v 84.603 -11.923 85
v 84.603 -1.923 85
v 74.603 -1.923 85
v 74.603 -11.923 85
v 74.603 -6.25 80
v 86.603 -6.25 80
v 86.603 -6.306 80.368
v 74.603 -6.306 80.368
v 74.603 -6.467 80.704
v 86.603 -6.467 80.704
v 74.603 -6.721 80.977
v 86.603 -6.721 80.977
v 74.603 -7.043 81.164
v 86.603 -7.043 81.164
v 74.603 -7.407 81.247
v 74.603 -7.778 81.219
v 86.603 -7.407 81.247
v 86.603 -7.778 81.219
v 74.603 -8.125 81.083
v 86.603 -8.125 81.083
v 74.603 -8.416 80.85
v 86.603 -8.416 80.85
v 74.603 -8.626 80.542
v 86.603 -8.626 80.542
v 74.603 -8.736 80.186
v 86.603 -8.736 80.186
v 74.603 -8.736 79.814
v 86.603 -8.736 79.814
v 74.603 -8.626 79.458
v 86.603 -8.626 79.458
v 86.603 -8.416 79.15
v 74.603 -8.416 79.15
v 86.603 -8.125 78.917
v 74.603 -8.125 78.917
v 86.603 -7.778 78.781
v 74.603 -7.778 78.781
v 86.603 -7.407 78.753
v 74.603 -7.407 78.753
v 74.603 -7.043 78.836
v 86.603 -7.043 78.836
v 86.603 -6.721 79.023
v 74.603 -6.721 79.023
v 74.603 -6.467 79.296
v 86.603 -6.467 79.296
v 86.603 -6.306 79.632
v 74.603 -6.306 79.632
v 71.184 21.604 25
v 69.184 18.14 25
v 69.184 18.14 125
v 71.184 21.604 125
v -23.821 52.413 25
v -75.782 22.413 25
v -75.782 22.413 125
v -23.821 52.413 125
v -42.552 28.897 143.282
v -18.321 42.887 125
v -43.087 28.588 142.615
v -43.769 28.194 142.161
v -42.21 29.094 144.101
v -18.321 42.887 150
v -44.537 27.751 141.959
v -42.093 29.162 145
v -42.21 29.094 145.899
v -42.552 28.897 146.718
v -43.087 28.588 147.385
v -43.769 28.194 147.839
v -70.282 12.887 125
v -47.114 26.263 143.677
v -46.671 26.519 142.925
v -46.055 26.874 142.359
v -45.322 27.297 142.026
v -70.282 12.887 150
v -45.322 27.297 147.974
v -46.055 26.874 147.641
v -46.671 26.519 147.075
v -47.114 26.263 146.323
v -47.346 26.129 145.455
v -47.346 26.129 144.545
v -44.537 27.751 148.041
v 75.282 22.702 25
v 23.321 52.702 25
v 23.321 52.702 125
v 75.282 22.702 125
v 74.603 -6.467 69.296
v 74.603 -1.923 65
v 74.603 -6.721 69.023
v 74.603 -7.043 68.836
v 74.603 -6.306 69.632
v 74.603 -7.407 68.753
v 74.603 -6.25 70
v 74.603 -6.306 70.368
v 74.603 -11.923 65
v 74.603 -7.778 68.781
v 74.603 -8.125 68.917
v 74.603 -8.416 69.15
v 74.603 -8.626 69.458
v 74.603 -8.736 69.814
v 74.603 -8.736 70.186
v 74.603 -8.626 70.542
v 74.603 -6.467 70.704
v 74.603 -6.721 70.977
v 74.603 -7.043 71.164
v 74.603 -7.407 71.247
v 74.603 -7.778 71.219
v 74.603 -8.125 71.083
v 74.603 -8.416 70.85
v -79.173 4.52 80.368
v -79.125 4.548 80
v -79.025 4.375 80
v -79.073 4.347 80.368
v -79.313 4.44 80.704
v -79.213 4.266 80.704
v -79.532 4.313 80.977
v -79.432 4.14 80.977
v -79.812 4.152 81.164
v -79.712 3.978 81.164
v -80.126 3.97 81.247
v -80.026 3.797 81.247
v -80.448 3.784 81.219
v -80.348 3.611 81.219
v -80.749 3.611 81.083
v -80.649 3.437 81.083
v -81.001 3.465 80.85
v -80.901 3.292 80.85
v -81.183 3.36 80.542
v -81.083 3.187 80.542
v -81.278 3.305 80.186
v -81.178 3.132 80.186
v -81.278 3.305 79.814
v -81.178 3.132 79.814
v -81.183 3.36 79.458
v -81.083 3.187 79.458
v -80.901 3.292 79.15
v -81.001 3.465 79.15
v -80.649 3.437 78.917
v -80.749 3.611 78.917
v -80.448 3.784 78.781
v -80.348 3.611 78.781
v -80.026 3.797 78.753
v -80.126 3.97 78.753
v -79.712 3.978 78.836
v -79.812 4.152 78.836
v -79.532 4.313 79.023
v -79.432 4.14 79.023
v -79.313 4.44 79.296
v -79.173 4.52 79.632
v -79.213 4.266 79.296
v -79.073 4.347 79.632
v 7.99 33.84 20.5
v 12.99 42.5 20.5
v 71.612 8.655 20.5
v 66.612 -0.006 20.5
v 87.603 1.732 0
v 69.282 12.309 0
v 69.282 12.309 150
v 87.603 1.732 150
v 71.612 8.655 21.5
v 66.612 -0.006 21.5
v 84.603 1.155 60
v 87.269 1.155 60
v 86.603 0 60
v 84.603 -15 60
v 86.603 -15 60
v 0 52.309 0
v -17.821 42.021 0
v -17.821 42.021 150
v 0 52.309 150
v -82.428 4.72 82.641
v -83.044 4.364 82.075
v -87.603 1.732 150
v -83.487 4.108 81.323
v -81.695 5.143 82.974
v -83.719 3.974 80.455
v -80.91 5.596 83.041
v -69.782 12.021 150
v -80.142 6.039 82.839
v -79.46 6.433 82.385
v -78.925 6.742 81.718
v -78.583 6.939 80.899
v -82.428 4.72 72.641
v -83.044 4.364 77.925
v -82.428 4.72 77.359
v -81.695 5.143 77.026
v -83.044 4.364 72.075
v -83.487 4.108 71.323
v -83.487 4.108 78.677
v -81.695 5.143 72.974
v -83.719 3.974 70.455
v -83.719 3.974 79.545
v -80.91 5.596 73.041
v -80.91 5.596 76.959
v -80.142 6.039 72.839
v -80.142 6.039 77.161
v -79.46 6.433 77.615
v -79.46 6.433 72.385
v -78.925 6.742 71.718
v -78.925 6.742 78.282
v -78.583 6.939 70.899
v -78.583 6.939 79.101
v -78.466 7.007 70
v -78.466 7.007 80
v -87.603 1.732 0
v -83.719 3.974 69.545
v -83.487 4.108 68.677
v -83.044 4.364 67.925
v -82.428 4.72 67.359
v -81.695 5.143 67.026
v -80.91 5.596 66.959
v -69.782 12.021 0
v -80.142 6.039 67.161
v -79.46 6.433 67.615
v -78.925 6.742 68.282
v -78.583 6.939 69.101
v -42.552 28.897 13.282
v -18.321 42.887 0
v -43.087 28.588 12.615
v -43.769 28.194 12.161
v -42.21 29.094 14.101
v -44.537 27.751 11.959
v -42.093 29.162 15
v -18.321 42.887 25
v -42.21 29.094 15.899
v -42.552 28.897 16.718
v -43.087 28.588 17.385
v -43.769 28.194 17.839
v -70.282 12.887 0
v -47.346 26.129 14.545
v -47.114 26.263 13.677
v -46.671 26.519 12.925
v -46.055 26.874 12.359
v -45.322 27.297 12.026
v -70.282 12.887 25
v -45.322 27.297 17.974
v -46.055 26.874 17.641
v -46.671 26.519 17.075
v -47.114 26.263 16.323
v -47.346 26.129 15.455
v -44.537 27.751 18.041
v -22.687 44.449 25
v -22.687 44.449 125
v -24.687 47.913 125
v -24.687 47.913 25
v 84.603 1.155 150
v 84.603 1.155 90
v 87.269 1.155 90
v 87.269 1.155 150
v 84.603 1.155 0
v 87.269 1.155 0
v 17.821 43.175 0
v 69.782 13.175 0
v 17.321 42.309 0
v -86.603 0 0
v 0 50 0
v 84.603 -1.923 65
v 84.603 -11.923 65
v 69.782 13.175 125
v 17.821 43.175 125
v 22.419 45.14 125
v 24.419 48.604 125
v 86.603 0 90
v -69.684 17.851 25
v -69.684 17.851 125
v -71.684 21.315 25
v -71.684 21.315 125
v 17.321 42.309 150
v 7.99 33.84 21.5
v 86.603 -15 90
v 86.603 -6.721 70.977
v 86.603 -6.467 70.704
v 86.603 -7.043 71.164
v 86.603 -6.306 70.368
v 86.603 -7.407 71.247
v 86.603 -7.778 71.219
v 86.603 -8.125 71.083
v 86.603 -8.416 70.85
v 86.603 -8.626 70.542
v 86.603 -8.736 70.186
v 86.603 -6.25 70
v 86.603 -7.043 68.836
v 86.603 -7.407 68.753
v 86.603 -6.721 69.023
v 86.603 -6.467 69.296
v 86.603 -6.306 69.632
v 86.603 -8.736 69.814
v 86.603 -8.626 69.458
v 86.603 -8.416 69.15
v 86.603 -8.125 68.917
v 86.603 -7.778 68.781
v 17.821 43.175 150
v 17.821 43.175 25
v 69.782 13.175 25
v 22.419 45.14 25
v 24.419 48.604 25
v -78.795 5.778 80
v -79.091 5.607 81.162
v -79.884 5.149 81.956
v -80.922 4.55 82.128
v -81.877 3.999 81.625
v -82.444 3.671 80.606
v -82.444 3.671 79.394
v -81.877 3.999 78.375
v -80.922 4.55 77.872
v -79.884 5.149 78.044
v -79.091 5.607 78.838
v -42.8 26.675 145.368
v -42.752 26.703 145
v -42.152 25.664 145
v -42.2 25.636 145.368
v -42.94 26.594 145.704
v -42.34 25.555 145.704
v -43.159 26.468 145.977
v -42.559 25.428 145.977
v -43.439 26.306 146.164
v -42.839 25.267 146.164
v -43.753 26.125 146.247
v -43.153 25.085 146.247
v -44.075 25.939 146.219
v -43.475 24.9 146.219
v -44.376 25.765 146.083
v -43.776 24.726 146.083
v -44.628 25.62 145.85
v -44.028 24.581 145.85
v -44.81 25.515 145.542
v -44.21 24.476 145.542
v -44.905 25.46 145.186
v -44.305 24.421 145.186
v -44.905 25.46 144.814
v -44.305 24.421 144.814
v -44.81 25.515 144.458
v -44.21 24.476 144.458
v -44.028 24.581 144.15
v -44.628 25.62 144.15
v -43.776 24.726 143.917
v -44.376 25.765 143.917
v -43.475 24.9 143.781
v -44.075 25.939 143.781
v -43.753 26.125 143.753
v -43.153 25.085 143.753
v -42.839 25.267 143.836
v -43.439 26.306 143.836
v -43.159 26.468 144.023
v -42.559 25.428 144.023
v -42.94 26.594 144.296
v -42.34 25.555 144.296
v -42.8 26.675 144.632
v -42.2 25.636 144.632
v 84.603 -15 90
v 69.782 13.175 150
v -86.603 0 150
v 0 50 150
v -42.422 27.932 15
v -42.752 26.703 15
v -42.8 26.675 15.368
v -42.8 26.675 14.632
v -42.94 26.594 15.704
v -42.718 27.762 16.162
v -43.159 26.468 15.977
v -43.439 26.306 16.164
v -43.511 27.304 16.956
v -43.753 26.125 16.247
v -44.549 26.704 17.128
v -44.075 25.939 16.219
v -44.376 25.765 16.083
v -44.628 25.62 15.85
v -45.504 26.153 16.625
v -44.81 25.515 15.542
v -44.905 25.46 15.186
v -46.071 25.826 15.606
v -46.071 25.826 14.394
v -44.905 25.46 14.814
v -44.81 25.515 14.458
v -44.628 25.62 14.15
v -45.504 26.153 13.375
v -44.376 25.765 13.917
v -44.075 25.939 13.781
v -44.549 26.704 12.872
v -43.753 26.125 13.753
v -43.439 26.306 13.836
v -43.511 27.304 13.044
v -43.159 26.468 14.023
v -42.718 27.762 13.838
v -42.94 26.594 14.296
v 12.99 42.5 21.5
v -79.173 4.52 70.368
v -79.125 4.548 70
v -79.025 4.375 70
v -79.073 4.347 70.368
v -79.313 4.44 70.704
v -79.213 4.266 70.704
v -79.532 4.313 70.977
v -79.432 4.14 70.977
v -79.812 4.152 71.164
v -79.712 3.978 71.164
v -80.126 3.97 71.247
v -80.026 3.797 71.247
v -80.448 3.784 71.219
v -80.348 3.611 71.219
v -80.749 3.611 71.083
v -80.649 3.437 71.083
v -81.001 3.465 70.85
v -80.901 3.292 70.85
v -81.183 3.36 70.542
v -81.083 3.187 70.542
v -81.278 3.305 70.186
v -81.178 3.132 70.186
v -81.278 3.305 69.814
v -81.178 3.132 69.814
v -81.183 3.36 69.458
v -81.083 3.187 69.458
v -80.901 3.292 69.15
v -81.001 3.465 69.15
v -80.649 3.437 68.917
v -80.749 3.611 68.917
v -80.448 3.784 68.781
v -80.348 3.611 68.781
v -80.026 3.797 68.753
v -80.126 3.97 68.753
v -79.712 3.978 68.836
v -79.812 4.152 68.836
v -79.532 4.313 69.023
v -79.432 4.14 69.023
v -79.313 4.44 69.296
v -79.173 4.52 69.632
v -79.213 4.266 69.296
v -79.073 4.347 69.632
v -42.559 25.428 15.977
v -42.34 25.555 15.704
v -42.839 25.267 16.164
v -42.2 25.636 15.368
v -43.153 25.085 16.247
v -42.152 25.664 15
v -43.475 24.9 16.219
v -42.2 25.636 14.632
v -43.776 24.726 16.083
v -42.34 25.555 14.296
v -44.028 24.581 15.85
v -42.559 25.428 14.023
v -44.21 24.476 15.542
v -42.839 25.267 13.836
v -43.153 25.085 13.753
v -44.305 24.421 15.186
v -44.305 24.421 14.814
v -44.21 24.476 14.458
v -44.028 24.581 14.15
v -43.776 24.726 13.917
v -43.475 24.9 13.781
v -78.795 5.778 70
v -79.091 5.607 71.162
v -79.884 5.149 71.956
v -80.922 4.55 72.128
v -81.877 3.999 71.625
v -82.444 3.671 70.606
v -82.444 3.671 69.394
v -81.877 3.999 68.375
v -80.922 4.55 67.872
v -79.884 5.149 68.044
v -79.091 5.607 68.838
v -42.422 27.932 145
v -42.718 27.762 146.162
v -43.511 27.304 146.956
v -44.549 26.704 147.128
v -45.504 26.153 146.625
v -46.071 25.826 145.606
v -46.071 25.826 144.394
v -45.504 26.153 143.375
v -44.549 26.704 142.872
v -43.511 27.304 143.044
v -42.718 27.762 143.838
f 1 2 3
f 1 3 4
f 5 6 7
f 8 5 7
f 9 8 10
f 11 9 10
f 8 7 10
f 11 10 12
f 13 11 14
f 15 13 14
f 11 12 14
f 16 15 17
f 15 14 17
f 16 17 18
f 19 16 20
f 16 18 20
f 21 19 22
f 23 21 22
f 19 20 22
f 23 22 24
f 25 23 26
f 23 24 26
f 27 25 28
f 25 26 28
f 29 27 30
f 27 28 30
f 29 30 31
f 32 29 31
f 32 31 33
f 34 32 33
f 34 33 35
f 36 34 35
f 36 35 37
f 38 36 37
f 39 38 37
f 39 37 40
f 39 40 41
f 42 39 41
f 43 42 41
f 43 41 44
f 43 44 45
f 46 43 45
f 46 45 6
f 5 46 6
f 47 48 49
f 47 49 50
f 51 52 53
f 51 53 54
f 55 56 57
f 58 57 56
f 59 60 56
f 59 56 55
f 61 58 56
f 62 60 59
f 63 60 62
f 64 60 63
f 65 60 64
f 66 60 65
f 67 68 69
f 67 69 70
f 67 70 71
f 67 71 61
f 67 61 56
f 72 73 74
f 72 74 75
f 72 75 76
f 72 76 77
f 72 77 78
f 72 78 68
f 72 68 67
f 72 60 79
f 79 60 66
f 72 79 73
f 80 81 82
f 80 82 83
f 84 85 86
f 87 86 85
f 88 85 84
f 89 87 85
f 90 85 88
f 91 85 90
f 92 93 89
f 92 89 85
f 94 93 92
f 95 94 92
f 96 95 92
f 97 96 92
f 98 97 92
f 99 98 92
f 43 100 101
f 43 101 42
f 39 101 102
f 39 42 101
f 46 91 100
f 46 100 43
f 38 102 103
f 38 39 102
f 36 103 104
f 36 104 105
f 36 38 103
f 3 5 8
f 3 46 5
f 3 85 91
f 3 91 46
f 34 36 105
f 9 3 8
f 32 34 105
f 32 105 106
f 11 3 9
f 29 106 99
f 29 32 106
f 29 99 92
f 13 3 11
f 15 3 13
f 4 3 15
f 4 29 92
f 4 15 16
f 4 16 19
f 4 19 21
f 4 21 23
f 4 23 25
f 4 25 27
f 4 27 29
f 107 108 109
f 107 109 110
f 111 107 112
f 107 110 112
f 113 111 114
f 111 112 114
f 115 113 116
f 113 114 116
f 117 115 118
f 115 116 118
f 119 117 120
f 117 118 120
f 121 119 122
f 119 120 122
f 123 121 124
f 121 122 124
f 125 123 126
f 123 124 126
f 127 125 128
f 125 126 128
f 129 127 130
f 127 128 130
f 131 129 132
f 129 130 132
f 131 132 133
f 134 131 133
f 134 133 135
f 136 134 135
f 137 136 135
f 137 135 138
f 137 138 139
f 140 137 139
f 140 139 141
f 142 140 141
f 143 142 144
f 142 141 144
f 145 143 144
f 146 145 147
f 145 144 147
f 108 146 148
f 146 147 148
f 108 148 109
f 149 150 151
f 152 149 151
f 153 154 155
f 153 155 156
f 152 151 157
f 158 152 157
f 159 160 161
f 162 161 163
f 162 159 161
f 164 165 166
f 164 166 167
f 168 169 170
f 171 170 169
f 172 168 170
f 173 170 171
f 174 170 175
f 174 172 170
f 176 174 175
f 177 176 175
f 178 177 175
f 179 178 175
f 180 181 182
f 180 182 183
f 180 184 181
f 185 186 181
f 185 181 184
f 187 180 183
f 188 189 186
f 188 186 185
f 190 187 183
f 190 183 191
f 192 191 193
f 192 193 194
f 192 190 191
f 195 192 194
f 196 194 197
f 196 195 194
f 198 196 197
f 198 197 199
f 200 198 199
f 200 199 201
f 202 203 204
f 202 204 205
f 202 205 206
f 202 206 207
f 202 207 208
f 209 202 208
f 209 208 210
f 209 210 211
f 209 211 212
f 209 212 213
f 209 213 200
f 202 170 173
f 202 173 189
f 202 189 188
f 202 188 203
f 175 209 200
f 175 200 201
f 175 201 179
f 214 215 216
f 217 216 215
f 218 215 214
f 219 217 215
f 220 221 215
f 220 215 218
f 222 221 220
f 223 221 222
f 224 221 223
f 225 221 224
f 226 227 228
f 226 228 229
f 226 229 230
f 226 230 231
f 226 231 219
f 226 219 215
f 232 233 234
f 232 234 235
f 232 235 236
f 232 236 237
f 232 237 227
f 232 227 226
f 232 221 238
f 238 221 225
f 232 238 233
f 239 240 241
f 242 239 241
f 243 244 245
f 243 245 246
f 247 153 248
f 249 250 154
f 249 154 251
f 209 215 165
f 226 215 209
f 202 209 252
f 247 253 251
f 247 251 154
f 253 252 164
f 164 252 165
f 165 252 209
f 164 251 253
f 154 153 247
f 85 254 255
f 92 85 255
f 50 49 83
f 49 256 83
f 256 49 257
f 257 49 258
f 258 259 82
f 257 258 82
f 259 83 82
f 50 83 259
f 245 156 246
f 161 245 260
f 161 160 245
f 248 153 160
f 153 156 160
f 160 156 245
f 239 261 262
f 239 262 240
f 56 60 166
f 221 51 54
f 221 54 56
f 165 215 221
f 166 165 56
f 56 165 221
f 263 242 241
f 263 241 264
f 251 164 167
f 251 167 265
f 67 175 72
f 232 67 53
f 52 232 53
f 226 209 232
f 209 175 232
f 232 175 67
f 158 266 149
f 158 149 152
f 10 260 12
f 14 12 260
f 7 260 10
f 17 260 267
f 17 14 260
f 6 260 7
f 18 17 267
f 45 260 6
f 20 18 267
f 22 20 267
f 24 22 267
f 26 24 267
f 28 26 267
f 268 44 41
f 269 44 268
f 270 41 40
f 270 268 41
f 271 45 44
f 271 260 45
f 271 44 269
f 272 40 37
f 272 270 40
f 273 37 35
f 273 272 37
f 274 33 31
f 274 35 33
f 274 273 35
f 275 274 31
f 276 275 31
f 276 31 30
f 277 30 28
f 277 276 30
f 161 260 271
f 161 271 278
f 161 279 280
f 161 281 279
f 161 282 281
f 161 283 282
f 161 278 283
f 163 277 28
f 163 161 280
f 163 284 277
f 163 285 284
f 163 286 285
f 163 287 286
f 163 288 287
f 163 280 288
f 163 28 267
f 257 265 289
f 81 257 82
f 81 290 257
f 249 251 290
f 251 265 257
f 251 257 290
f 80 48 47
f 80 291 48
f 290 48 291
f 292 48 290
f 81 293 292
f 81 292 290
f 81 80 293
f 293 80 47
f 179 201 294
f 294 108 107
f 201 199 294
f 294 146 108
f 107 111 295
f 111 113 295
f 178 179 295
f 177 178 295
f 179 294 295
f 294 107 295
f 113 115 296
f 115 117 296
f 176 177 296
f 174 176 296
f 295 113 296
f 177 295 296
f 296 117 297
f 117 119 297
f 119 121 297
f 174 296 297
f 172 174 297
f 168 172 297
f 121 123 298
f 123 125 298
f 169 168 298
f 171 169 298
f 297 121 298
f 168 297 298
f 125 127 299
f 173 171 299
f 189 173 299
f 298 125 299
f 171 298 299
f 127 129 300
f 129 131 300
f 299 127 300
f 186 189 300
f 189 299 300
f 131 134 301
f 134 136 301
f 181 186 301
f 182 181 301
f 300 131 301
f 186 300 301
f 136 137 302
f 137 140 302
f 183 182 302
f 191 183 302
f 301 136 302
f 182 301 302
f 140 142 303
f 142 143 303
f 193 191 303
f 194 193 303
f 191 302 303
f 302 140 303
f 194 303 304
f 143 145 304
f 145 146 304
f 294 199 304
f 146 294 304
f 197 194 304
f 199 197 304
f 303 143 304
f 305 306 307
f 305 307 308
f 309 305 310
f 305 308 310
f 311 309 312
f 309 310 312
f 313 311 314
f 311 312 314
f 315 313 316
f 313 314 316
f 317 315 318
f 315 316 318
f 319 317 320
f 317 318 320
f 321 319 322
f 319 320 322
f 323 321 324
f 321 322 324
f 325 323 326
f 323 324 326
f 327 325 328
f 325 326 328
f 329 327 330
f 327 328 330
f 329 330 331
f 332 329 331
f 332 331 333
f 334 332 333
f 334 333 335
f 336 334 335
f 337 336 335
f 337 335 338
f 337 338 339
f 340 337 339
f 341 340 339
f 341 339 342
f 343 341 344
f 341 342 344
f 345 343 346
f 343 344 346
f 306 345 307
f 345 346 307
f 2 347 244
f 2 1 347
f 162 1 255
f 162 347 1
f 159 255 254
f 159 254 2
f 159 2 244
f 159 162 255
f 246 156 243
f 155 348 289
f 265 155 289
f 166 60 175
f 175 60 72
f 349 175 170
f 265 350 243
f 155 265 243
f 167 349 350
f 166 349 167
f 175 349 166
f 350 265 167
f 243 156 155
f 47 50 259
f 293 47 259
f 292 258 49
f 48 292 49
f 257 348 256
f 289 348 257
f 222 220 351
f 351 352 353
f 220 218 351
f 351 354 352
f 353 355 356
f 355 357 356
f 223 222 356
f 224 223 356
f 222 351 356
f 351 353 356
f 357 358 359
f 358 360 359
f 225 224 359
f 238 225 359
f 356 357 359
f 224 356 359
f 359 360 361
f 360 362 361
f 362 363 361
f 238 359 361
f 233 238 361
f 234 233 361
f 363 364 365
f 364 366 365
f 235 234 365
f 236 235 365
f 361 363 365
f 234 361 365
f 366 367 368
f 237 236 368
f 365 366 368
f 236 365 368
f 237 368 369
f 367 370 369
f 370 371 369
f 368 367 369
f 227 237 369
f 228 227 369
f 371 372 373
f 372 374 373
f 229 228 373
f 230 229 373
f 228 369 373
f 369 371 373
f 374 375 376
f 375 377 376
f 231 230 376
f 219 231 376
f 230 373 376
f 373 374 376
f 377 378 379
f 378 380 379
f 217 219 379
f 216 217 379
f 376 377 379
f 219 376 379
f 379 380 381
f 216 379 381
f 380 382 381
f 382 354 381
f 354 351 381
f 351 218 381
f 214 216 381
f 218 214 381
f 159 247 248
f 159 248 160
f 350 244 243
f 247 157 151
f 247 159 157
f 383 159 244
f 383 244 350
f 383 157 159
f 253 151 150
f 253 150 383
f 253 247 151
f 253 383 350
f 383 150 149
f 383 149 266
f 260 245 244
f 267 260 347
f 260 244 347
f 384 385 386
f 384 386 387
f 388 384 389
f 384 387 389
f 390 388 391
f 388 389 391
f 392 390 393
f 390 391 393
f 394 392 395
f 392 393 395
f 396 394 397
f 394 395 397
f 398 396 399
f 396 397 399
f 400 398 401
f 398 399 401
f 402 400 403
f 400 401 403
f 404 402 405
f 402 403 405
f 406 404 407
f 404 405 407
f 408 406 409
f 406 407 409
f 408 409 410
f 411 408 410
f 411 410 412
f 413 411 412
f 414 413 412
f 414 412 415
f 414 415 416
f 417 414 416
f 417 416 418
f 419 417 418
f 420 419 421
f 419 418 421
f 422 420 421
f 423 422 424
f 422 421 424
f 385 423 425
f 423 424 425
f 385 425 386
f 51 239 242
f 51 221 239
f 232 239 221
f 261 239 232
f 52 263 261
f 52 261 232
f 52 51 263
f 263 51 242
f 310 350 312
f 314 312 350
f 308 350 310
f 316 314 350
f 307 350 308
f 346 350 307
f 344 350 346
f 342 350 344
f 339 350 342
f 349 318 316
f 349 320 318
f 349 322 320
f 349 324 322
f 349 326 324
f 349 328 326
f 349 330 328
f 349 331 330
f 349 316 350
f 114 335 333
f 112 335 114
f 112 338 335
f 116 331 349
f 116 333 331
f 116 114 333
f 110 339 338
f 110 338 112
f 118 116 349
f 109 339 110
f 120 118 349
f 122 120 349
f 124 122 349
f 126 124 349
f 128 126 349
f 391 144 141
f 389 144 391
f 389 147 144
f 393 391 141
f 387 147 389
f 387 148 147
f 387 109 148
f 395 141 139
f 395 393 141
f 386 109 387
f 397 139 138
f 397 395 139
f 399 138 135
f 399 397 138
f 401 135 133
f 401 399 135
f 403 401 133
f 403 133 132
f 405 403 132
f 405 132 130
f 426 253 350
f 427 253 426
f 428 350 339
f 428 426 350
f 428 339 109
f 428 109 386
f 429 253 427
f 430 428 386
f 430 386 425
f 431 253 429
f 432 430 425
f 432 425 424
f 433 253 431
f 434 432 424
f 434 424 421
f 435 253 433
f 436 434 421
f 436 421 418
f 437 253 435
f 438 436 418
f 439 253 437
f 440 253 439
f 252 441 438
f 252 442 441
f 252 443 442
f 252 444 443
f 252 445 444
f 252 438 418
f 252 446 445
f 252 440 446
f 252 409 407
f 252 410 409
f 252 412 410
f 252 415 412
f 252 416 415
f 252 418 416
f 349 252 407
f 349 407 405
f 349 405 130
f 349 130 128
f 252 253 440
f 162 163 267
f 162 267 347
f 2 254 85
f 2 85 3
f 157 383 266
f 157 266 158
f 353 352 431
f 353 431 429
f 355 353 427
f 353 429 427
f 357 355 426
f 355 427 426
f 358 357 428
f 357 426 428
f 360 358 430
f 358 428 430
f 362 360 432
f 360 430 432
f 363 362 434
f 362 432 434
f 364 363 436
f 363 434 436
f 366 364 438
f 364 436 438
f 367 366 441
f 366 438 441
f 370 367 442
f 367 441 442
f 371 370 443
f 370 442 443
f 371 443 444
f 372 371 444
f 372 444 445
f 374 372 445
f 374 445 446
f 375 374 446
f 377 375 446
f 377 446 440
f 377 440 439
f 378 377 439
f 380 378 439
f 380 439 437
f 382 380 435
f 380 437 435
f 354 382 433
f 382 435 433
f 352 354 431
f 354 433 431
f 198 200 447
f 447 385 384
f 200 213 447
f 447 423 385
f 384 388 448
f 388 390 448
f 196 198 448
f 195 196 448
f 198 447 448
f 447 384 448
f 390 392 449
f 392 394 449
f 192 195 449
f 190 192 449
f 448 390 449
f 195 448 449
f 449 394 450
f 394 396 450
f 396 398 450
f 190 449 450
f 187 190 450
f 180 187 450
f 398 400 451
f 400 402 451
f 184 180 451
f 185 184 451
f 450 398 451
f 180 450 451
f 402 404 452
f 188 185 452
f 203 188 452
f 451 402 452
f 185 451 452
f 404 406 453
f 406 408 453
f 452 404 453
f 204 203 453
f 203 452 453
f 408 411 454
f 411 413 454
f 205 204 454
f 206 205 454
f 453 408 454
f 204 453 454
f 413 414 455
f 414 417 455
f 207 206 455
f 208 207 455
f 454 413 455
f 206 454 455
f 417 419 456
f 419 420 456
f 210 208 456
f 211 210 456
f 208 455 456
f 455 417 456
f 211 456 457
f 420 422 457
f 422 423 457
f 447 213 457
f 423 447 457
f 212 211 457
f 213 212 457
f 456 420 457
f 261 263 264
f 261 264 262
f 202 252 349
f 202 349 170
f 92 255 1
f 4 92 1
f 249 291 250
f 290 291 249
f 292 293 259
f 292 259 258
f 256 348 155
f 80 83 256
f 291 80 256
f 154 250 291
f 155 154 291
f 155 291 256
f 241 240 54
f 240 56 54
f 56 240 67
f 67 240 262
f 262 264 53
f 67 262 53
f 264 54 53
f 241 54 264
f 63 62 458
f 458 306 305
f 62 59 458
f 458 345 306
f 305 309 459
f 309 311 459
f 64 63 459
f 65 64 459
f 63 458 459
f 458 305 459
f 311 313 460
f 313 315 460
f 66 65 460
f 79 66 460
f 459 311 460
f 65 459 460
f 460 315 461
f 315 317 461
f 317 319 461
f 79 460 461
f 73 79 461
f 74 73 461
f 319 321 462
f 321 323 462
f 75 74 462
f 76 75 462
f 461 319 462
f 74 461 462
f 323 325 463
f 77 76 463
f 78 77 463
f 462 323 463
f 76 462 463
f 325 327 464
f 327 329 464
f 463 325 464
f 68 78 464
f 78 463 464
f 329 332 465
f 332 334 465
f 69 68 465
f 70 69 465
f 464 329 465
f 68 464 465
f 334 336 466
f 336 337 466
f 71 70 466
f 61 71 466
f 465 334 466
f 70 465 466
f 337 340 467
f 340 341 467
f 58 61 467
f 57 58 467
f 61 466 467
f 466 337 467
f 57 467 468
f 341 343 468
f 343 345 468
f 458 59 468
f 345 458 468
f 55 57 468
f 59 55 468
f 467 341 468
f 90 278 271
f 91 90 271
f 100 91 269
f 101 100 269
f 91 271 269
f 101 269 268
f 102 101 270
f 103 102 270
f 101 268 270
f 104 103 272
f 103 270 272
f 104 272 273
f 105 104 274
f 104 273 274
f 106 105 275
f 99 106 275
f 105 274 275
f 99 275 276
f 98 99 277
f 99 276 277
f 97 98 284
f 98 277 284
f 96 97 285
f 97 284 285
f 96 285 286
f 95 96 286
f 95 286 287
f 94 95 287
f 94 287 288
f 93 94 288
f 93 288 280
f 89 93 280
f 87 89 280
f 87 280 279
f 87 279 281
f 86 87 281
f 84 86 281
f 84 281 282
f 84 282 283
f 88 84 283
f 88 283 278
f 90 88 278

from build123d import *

# Parameters (mm, degrees)
PAD_DEPTH           = 150
SKETCH001_W         = 32.4797945384
SKETCH001_H         = 60
SKETCH001_W_2       = 36.6107585384
POCKET_DEPTH        = 5
SKETCH007_W         = 10
SKETCH007_H         = 20
PAD001_DEPTH        = 10
SKETCH002_R         = 1.25
HOLE_DEPTH          = 25
HOLE_TIPS_R         = 1.25
HOLE001_D           = 2.5
HOLE001_DEPTH       = 25
HOLE001_CSINK_D     = 6.1
HOLE001_CSINK_ANGLE = 90
HOLE001_TIPS_R      = 1.25
SKETCH006_W         = 74.5044810012
SKETCH006_H         = 25
SKETCH006_W_2       = 72.8484770001
POCKET001_DEPTH     = 11
SKETCH005_W         = 80.411114
SKETCH005_H         = 25
SKETCH005_W_2       = 78.205579
POCKET002_DEPTH     = 11
SKETCH009_W         = 67.6905989232
SKETCH009_H         = 1
PAD002_DEPTH        = 10
HOLE002_D           = 2.5
HOLE002_DEPTH       = 25
HOLE002_CSINK_D     = 6.1
HOLE002_CSINK_ANGLE = 90
HOLE002_TIPS_R      = 1.25


with BuildPart() as part:
    # Sketch → Pad (new body)
    with BuildSketch(Plane.XY):
        Polygon((84.6025403784, 1.1547005384), (0, 50), (-86.6025403784, 0), (-87.6025403784, 1.7320508076), (-69.7820323028, 12.0207259422), (-75.7820323028, 22.4130307876), (-23.8205080757, 52.4130307876), (-17.8205080757, 42.0207259422), (0, 52.3094010768), (17.3205080757, 42.3094010768), (23.3205080757, 52.7017059222), (75.2820323028, 22.7017059222), (69.2820323028, 12.3094010768), (87.6025403784, 1.7320508076), (86.6025403784, 0), (86.6025403784, -15), (84.6025403784, -15), align=None)
        Polygon((-71.6839560914, 21.3149545762), (-69.6839560914, 17.8508529611), (-22.6865334795, 44.4489291724), (-24.6865334795, 47.9130307876), align=None, mode=Mode.SUBTRACT)
        Polygon((69.1839560914, 18.1395280957), (71.1839560914, 21.6036297108), (24.418584287, 48.6036297108), (22.418584287, 45.1395280957), align=None, mode=Mode.SUBTRACT)
    extrude(amount=PAD_DEPTH)

    # Sketch001 (on Face4 of Pad) → Pocket (cut)
    with BuildSketch(Plane(origin=(84.6025403784, 0, 0), x_dir=(0, -1, 0), z_dir=(-1, 0, 0))):
        with Locations((15.0851967308, 30)):
            Rectangle(SKETCH001_W, SKETCH001_H)
        with Locations((17.1506787308, 120)):
            Rectangle(SKETCH001_W_2, SKETCH001_H)
    extrude(amount=-POCKET_DEPTH, mode=Mode.SUBTRACT)

    # Sketch007 (on Face30 of Pocket) → Pad001 (join)
    with BuildSketch(Plane(origin=(84.6025403784, 0, 0), x_dir=(0, -1, 0), z_dir=(-1, 0, 0))):
        with Locations((6.9226497308, 75)):
            Rectangle(SKETCH007_W, SKETCH007_H)
    extrude(amount=PAD001_DEPTH)

    # Sketch002 (on Face5 of Pocket) → Hole (cut)
    with BuildSketch(Plane.YZ.offset(86.6025403784)):
        with Locations((-7.5, 80)):
            Circle(SKETCH002_R)
        with Locations((-7.5, 70)):
            Circle(SKETCH002_R)
    extrude(amount=-HOLE_DEPTH, mode=Mode.SUBTRACT)

    # Hole tips → Hole tip 1 section 0
    with BuildSketch(Plane.YZ.offset(61.6025403784), mode=Mode.PRIVATE) as hole_tip_1_s0:
        with Locations((-7.5, 80)):
            Circle(HOLE_TIPS_R)
    loft([hole_tip_1_s0.sketch, Vertex(60.8514646047, -7.5, 80)], mode=Mode.SUBTRACT)

    # Hole tips → Hole tip 2 section 0
    with BuildSketch(Plane.YZ.offset(61.6025403784), mode=Mode.PRIVATE) as hole_tip_2_s0:
        with Locations((-7.5, 70)):
            Circle(HOLE_TIPS_R)
    loft([hole_tip_2_s0.sketch, Vertex(60.8514646047, -7.5, 70)], mode=Mode.SUBTRACT)

    # Hole001
    with Locations(Plane(origin=(-22.6506350946, 39.2320508076, 0), x_dir=(-0.8660254038, -0.5, 0), z_dir=(-0.5, 0.8660254038, 0))):
        with Locations((67.5, 80), (67.5, 70)):
            CounterSinkHole(HOLE001_D / 2, HOLE001_CSINK_D / 2, depth=HOLE001_DEPTH, counter_sink_angle=HOLE001_CSINK_ANGLE)

    # Hole001 tips → Hole001 tip 1 section 0
    with BuildSketch(Plane(origin=(-10.1506350946, 17.581415713, 0), x_dir=(-0.8660254038, -0.5, 0), z_dir=(-0.5, 0.8660254038, 0)), mode=Mode.PRIVATE) as hole001_tip_1_s0:
        with Locations((67.5, 80)):
            Circle(HOLE001_TIPS_R)
    loft([hole001_tip_1_s0.sketch, Vertex(-68.2318119632, -16.8190349873, 80)], mode=Mode.SUBTRACT)

    # Hole001 tips → Hole001 tip 2 section 0
    with BuildSketch(Plane(origin=(-10.1506350946, 17.581415713, 0), x_dir=(-0.8660254038, -0.5, 0), z_dir=(-0.5, 0.8660254038, 0)), mode=Mode.PRIVATE) as hole001_tip_2_s0:
        with Locations((67.5, 70)):
            Circle(HOLE001_TIPS_R)
    loft([hole001_tip_2_s0.sketch, Vertex(-68.2318119632, -16.8190349873, 70)], mode=Mode.SUBTRACT)

    # Sketch006 (on Face15 of Pocket) → Pocket001 (cut)
    with BuildSketch(Plane(origin=(-28.6506350946, 49.624355653, 0), x_dir=(-0.8660254038, -0.5, 0), z_dir=(-0.5, 0.8660254038, 0))):
        with Locations((24.7169745006, 137.5)):
            Rectangle(SKETCH006_W, SKETCH006_H)
        with Locations((24.0525555, 12.5)):
            Rectangle(SKETCH006_W_2, SKETCH006_H)
    extrude(amount=-POCKET001_DEPTH, mode=Mode.SUBTRACT)

    # Sketch005 (on Face20 of Pocket) → Pocket002 (cut)
    with BuildSketch(Plane(origin=(28.6506350946, 49.624355653, 0), x_dir=(-0.8660254038, 0.5, 0), z_dir=(0.5, 0.8660254038, 0))):
        with Locations((-23.058333, 137.5)):
            Rectangle(SKETCH005_W, SKETCH005_H)
        with Locations((-22.9755485, 12.5)):
            Rectangle(SKETCH005_W_2, SKETCH005_H)
    extrude(amount=-POCKET002_DEPTH, mode=Mode.SUBTRACT)

    # Sketch009 (on Face10 of Pocket) → Pad002 (join)
    with BuildSketch(Plane(origin=(21.6506350946, 37.5, 0), x_dir=(0.8660254038, -0.5, 0), z_dir=(-0.5, -0.8660254038, 0))):
        with Locations((23.8452994616, 21)):
            Rectangle(SKETCH009_W, SKETCH009_H)
    extrude(amount=PAD002_DEPTH)

    # Hole002
    with Locations(Plane(origin=(-23.1506350946, 40.0980762114, 0), x_dir=(-0.8660254038, -0.5, 0), z_dir=(-0.5, 0.8660254038, 0))):
        with Locations((24.9226497308, 145), (24.9226497308, 15)):
            CounterSinkHole(HOLE002_D / 2, HOLE002_CSINK_D / 2, depth=HOLE002_DEPTH, counter_sink_angle=HOLE002_CSINK_ANGLE)

    # Hole002 tips → Hole002 tip 1 section 0
    with BuildSketch(Plane(origin=(-10.6506350946, 18.4474411167, 0), x_dir=(-0.8660254038, -0.5, 0), z_dir=(-0.5, 0.8660254038, 0)), mode=Mode.PRIVATE) as hole002_tip_1_s0:
        with Locations((24.9226497308, 145)):
            Circle(HOLE002_TIPS_R)
    loft([hole002_tip_1_s0.sketch, Vertex(-31.8587450042, 5.3356655511, 145)], mode=Mode.SUBTRACT)

    # Hole002 tips → Hole002 tip 2 section 0
    with BuildSketch(Plane(origin=(-10.6506350946, 18.4474411167, 0), x_dir=(-0.8660254038, -0.5, 0), z_dir=(-0.5, 0.8660254038, 0)), mode=Mode.PRIVATE) as hole002_tip_2_s0:
        with Locations((24.9226497308, 15)):
            Circle(HOLE002_TIPS_R)
    loft([hole002_tip_2_s0.sketch, Vertex(-31.8587450042, 5.3356655511, 15)], mode=Mode.SUBTRACT)


solid = part.part
